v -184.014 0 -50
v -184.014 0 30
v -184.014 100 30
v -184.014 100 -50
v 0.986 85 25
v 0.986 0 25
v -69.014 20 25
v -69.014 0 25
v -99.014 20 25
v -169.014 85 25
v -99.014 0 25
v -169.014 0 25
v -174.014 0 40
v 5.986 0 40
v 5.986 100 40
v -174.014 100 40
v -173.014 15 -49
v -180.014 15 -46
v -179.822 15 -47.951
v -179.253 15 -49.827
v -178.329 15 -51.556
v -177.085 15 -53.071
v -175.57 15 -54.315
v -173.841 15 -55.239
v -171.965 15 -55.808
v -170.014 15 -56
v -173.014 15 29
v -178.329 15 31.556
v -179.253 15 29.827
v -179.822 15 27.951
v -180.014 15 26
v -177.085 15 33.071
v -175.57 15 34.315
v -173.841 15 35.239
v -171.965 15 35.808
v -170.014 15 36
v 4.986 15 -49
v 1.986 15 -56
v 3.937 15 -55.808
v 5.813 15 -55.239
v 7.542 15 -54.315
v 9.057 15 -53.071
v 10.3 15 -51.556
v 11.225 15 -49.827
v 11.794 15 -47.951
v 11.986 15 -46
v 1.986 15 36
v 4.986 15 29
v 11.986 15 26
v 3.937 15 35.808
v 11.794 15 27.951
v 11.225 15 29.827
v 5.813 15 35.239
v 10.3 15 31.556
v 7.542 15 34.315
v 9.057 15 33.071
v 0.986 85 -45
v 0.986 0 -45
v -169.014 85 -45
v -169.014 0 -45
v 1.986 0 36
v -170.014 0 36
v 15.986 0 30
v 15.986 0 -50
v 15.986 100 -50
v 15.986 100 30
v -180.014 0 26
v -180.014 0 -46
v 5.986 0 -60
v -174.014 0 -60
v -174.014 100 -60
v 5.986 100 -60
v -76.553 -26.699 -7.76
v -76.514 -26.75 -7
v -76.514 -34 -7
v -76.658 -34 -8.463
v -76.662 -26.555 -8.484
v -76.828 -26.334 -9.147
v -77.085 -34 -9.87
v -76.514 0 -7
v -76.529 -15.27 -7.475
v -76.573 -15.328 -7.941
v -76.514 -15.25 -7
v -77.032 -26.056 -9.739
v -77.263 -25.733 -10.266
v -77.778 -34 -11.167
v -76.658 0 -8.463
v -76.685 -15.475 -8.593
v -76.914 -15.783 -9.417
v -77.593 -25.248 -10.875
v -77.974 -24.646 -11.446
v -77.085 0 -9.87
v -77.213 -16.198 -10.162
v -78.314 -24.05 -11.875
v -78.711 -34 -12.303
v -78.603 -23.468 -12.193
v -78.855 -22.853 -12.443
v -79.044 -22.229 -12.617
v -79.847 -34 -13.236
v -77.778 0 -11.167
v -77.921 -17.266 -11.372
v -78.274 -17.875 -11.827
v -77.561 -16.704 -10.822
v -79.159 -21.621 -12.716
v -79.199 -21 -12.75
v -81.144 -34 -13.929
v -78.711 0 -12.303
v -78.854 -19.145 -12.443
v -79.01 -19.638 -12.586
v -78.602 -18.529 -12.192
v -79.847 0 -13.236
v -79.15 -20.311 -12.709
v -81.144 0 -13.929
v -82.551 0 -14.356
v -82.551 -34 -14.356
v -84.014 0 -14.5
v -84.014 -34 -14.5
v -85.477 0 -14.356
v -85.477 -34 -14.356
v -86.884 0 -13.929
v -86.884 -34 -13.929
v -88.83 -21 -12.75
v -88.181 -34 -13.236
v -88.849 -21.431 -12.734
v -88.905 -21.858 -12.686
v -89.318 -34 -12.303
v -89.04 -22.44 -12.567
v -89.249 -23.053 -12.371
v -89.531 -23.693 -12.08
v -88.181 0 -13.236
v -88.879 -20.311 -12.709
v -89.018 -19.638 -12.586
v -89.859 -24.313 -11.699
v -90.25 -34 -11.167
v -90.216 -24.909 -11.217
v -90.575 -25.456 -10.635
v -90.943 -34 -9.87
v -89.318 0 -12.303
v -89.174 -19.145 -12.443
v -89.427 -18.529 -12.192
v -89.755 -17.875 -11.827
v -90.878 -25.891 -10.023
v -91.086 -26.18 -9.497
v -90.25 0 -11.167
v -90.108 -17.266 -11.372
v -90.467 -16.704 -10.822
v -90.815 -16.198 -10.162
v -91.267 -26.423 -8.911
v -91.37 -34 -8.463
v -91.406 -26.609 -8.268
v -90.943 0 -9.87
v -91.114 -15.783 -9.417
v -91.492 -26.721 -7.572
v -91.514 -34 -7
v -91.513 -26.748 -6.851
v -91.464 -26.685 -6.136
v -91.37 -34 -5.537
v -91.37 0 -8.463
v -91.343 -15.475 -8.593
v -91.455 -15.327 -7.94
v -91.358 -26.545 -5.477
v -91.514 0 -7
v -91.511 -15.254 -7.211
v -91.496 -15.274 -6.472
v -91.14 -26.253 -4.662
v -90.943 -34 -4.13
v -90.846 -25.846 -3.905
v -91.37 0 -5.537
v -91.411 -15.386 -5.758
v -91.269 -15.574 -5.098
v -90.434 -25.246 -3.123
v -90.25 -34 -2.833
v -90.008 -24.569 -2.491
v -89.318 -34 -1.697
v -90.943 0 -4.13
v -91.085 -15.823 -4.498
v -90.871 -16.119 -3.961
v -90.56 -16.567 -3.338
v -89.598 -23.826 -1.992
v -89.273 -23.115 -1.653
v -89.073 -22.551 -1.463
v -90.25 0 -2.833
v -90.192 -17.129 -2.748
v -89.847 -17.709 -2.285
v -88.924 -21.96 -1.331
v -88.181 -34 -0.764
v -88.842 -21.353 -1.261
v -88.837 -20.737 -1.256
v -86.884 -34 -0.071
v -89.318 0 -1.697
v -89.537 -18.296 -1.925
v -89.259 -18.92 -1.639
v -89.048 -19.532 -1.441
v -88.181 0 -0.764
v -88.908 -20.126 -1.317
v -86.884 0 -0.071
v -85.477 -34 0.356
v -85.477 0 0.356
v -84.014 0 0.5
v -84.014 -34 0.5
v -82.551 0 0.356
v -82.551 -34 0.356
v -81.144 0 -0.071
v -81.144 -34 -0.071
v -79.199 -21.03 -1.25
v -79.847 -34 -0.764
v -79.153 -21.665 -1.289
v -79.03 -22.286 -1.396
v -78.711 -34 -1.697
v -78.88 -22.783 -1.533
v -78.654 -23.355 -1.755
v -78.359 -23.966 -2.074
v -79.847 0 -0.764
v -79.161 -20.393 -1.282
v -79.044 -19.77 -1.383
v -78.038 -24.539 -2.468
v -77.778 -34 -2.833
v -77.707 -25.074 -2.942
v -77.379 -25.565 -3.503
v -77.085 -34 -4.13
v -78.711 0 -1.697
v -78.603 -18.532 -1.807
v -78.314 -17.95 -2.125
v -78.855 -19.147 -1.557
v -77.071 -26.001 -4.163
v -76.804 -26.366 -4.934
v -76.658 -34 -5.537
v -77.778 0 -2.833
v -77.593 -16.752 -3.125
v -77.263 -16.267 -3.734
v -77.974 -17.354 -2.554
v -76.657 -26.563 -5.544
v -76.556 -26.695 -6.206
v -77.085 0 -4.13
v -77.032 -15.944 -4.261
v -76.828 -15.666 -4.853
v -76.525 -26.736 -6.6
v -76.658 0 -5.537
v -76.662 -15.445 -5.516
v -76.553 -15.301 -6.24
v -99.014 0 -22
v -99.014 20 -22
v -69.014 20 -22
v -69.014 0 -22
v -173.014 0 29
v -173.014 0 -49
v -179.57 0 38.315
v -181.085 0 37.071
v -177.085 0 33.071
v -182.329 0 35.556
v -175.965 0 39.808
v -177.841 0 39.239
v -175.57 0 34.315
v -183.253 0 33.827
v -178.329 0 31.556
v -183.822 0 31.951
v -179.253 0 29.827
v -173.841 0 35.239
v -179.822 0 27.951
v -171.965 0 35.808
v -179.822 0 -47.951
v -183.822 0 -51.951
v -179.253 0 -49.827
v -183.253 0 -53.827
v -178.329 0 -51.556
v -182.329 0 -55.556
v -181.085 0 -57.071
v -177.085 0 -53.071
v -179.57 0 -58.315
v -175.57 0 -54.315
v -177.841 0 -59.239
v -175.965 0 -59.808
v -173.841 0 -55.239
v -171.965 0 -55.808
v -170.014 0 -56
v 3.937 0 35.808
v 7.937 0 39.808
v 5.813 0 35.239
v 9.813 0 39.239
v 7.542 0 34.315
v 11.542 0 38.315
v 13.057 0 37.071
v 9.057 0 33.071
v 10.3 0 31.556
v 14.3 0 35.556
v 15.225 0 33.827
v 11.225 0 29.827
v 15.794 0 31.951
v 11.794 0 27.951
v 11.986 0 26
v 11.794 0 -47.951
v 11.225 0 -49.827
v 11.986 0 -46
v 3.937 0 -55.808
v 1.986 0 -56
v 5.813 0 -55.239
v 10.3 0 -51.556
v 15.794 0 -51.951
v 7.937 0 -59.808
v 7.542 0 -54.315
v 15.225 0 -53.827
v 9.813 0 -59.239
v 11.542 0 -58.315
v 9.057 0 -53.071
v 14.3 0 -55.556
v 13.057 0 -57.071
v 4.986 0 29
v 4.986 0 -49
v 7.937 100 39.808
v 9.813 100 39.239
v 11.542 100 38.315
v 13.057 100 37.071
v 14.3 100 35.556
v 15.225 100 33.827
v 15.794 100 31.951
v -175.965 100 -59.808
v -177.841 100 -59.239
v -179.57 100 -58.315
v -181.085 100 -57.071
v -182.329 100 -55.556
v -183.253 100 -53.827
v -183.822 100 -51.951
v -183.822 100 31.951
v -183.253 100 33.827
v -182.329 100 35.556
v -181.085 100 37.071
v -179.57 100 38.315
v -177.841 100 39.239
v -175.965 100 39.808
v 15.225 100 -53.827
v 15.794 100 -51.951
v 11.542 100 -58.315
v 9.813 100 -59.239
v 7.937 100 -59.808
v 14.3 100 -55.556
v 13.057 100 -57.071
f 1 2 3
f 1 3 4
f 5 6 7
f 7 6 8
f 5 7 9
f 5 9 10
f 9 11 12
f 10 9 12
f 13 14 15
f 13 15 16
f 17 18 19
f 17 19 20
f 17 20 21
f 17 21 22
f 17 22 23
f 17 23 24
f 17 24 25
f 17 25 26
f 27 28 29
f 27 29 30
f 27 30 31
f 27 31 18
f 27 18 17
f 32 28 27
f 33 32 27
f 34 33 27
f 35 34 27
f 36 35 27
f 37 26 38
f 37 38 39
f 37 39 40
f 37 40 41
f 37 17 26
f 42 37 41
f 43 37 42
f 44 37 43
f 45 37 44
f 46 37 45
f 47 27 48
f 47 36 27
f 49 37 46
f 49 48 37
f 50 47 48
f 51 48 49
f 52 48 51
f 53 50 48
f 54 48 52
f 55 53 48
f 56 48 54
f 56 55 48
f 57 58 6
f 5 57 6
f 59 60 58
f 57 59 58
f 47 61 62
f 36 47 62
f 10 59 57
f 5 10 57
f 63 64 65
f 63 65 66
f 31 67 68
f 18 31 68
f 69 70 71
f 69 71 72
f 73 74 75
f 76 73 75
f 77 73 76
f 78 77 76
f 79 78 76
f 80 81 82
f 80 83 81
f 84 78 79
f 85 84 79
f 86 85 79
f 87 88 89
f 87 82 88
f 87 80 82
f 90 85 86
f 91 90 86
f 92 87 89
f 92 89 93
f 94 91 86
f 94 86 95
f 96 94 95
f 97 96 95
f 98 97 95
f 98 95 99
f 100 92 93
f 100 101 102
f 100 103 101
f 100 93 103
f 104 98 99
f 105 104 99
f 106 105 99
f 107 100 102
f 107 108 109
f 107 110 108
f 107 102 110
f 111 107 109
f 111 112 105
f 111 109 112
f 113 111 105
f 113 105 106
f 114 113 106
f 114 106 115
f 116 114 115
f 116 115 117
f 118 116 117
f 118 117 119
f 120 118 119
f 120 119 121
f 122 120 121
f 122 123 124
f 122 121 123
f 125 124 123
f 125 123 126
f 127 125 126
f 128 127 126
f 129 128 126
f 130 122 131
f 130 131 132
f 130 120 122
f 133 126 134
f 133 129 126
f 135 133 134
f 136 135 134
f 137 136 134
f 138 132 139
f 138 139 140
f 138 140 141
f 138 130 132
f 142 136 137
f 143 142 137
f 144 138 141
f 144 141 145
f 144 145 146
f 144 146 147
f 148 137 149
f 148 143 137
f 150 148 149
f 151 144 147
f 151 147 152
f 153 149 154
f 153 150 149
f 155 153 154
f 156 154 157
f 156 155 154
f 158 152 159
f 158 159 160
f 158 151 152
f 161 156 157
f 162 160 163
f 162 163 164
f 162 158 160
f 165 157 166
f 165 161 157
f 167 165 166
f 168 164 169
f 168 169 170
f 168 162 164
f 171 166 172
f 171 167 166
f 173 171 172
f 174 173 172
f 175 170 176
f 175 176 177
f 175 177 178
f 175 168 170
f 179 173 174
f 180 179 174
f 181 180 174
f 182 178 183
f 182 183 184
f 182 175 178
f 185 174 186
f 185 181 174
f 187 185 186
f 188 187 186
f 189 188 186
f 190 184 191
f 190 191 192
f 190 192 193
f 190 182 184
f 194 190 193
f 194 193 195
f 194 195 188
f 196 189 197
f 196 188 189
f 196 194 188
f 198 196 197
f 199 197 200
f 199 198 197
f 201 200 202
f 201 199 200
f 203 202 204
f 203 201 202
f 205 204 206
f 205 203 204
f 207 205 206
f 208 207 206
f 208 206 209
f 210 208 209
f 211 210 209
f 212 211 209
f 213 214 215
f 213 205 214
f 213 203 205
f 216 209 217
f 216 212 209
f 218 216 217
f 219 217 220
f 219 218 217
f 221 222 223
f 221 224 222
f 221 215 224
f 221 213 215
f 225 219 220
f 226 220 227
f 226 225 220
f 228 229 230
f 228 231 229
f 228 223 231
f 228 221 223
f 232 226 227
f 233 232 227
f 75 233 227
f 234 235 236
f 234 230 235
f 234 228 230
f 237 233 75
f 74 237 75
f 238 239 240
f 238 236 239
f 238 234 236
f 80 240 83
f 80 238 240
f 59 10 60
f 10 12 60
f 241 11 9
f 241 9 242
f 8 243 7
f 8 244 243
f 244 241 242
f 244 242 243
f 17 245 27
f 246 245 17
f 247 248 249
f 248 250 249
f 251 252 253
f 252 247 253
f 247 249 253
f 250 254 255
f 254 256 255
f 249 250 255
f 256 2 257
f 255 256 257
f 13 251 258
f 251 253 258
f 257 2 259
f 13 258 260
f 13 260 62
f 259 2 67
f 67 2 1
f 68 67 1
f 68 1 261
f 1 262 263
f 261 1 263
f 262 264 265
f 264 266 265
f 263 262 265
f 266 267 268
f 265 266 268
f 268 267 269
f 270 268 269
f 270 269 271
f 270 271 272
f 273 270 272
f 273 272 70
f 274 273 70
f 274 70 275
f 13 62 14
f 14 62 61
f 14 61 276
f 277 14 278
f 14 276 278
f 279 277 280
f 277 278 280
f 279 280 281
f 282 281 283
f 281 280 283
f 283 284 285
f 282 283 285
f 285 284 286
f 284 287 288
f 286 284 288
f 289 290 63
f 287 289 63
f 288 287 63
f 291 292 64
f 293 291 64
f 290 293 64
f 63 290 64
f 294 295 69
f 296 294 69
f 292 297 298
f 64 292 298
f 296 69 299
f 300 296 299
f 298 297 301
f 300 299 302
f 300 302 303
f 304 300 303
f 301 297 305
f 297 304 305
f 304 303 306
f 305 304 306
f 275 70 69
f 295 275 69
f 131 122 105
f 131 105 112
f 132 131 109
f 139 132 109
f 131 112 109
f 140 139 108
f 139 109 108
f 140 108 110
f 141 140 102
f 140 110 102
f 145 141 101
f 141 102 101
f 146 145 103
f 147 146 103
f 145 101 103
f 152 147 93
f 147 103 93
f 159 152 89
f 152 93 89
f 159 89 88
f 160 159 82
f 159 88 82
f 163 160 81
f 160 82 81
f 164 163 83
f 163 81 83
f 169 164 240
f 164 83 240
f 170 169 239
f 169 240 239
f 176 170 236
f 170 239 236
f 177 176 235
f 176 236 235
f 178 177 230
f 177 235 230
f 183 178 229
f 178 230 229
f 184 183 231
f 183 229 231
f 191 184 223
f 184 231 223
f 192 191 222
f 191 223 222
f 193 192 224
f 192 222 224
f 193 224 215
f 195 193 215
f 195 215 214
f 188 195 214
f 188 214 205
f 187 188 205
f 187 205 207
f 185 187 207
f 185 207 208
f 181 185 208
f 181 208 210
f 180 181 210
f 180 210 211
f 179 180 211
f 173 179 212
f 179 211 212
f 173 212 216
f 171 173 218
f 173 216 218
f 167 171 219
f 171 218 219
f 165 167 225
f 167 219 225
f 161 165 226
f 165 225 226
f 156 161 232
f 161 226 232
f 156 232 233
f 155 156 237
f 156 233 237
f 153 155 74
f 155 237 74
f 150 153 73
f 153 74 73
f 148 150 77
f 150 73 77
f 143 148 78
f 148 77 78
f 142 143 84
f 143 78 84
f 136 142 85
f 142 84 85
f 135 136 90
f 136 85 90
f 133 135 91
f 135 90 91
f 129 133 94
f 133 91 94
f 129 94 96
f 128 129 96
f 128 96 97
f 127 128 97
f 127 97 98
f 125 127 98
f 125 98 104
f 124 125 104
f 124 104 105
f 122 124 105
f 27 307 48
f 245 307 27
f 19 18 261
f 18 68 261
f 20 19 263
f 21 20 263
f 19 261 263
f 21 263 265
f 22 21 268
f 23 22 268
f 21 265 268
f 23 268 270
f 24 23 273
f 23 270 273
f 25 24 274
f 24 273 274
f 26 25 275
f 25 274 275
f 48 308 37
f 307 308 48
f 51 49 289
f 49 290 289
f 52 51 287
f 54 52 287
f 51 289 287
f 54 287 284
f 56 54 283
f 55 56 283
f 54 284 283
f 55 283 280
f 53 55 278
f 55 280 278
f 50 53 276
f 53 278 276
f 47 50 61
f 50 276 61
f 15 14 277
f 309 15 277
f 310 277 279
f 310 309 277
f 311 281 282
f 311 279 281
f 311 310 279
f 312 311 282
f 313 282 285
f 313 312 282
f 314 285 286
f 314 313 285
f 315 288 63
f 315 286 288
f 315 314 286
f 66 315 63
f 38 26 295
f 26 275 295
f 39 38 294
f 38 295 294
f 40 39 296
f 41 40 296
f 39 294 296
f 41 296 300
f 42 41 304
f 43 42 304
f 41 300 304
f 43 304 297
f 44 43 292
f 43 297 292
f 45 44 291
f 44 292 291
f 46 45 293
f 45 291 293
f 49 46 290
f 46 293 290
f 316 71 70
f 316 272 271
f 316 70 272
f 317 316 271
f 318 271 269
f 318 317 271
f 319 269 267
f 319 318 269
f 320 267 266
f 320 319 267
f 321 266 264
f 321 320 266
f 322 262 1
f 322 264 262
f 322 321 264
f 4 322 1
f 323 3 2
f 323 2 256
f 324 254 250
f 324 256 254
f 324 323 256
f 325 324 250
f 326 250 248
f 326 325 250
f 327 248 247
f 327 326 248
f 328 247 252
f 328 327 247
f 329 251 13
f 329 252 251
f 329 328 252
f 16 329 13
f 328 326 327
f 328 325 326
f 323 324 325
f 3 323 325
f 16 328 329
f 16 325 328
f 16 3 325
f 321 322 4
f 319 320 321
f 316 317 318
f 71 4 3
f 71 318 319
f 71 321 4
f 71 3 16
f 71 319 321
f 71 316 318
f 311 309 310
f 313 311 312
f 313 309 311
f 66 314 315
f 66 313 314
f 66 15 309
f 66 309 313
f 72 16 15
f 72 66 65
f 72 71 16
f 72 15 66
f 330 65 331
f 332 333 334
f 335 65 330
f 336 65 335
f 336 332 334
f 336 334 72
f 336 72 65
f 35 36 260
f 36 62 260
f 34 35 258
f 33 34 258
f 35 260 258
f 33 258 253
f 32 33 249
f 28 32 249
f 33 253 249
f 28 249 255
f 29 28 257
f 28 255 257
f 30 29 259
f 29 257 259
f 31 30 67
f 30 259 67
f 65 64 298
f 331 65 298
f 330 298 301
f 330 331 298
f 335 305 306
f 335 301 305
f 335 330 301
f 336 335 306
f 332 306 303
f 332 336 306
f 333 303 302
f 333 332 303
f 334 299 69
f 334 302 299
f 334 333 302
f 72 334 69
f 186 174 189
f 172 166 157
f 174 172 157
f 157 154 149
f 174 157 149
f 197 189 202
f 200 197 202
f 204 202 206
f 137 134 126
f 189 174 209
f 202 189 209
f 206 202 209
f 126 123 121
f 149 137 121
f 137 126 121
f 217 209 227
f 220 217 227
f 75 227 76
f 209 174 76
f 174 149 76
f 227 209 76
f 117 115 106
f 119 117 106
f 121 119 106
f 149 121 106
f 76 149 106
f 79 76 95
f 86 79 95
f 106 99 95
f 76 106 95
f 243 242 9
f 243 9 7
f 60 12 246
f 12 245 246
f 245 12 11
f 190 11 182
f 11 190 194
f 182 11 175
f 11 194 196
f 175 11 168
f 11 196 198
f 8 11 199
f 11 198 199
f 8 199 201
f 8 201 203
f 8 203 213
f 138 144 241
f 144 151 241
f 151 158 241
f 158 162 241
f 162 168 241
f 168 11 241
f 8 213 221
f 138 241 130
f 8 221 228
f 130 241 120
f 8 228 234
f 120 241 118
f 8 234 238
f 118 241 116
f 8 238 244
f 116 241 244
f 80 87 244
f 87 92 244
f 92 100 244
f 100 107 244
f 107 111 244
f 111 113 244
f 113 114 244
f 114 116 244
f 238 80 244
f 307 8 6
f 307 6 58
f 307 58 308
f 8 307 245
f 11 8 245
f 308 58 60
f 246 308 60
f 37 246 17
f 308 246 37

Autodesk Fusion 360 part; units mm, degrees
sketch "Sketch1" plane through (0, 0, 0) normal (0, 1, 0) x (1, 0, 0) in component "Bottom of Box"
  line L0 (-184.0142, 60) -> (15.9858, 60)
  line L1 (15.9858, 60) -> (15.9858, -40)
  line L2 (15.9858, -40) -> (-184.0142, -40)
  line L3 (-184.0142, -40) -> (-184.0142, 60)
  line L4 (-169.0142, 45) -> (0.9858, 45)
  line L5 (0.9858, 45) -> (0.9858, -25)
  line L6 (0.9858, -25) -> (-169.0142, -25)
  line L7 (-169.0142, -25) -> (-169.0142, 45)
  dimension "d1" = 100
  dimension "d2" = 200
  dimension "d3" = 170
  dimension "d4" = 70
  dimension "d5" = 15
  dimension "d6" = 15
extrude "Extrude1" add sketch "Sketch1" along normal blind 100 contours L0 L1 L2 L3 | L4 L5 L6 L7 in component "Bottom of Box"
extrude "Extrude2" cut sketch "Sketch1" along normal blind 85 contours L4 L5 L6 L7 in component "Bottom of Box"
fillet "Fillet1" radius 10 1 edges at (15.9858, 50, -60) in component "Bottom of Box"
fillet "Fillet2" radius 10 1 edges at (15.9858, 50, 40) in component "Bottom of Box"
fillet "Fillet3" radius 10 1 edges at (-184.0142, 50, 40) in component "Bottom of Box"
fillet "Fillet4" radius 10 1 edges at (-184.0142, 50, -60) in component "Bottom of Box"
sketch "Sketch1 (2)" plane through (0, 0, 0) normal (0, 1, 0) x (1, 0, 0)
  line L0 (-69.0142, -25) -> (-99.0142, -25)
  line L1 (-99.0142, -25) -> (-99.0142, 22)
  line L2 (-99.0142, 22) -> (-69.0142, 22)
  line L3 (-69.0142, 22) -> (-69.0142, -25)
  line L4 (0.9858, -25) -> (0.9858, 45)
  dimension "d30" = 30
  dimension "d31" = 70
  dimension "d79" = 47
extrude "Extrude4" add sketch "Sketch1 (2)" along normal blind 20 in component "Bottom of Box"
sketch "Sketch2" plane through (0, 0, 0) normal (0, 1, 0) x (1, 0, 0)
  circle A0 centre (-84.0142, 7) radius 7.5
  line L0 (-99.0142, 22) -> (-69.0142, 22)
  line L1 (-99.0142, -25) -> (-99.0142, 22)
  dimension "d34" = 15
  dimension "d35" = 15
  dimension "d36" = 15
extrude "Extrude5" add sketch "Sketch2" against normal blind 25 in component "Bottom of Box"
sketch "Sketch3" plane through (0, 0, 0) normal (1, 0, 0) x (0, 0, -1)
  curve A0
  line L0 (-0.5, -25) -> (14.5, -25)
  dimension "d40" = 12.5
  dimension "d81" = 12.5
extrude "Extrude7" cut 1 faces at (-82.4555, -25, -8.9546) along direction (0, 1, 0) blind 10 in component "Bottom of Box"
extrude "Extrude8" add 1 faces at (-82.4555, -15, -8.9546) along direction (0, -1, 0) blind 19 in component "Bottom of Box"
sketch "Sketch5" plane through (0, 0, 0) normal (0, -1, 0) x (1, 0, 0)
  circle A0 centre (-84.0142, -7) radius 7.5
  line L0 (-169.0142, -45) -> (-169.0142, 25)
  line L1 (-169.0142, 25) -> (-99.0142, 25)
  line L2 (-99.0142, 25) -> (-99.0142, -22)
  line L3 (-99.0142, -22) -> (-69.0142, -22)
  line L4 (-69.0142, -22) -> (-69.0142, 25)
  line L5 (-69.0142, 25) -> (0.9858, 25)
  line L6 (0.9858, 25) -> (0.9858, -45)
  line L7 (0.9858, -45) -> (-169.0142, -45)
  arc A1 (-184.0142, -50) -> (-174.0142, -60) centre (-174.0142, -50) ccw
  line L8 (-174.0142, -60) -> (5.9858, -60)
  arc A2 (5.9858, -60) -> (15.9858, -50) centre (5.9858, -50) ccw
  line L9 (15.9858, -50) -> (15.9858, 30)
  arc A3 (15.9858, 30) -> (5.9858, 40) centre (5.9858, 30) ccw
  line L10 (5.9858, 40) -> (-174.0142, 40)
  arc A4 (-174.0142, 40) -> (-184.0142, 30) centre (-174.0142, 30) ccw
  line L11 (-184.0142, 30) -> (-184.0142, -50)
  line L12 (-170.0142, -56) -> (1.9858, -56)
  line L13 (11.9858, -46) -> (11.9858, 26)
  line L14 (1.9858, 36) -> (-170.0142, 36)
  line L15 (-180.0142, 26) -> (-180.0142, -46)
  line L16 (-173.0142, -49) -> (4.9858, -49)
  line L17 (4.9858, -49) -> (4.9858, 29)
  line L18 (4.9858, 29) -> (-173.0142, 29)
  line L19 (-173.0142, 29) -> (-173.0142, -49)
  arc A5 (11.9858, 26) -> (1.9858, 36) centre (1.9858, 26) ccw
  arc A6 (1.9858, -56) -> (11.9858, -46) centre (1.9858, -46) ccw
  arc A7 (-180.0142, -46) -> (-170.0142, -56) centre (-170.0142, -46) ccw
  arc A8 (-170.0142, 36) -> (-180.0142, 26) centre (-170.0142, 26) ccw
  point P0 (-180.0142, -56)
  point P1 (11.9858, -56)
  dimension "d52" = 192
  dimension "d53" = 92
  dimension "d54" = 4
  dimension "d55" = 4
  dimension "d56" = 78
  dimension "d57" = 178
  dimension "d58" = 7
  dimension "d59" = 7
  dimension "d60" = 10
extrude "Extrude10" cut sketch "Sketch5" against normal blind 15 contours L12 L13 L14 L15 A5 A6 A7 A8 in component "Bottom of Box"
sketch "Sketch6" plane through (0, 0, 0) normal (1, 0, 0) x (0, 0, -1)
sketch "Sketch7" plane through (0, 0, 0) normal (1, 0, 0) x (0, 0, -1)
  circle A0 centre (7, -21) radius 5.75
  line L0 (-0.5, -34) -> (14.5, -34)
  dimension "d69" = 7.5
  dimension "d82" = 11.5
  dimension "d84" = 13
extrude "Extrude11" cut sketch "Sketch7" against normal blind 100 in component "Bottom of Box"
component "Bottom of Box" placed x (1, 0, 0) y (0, 1, 0) z (0, 0, 1) at (0, 0, 0)
